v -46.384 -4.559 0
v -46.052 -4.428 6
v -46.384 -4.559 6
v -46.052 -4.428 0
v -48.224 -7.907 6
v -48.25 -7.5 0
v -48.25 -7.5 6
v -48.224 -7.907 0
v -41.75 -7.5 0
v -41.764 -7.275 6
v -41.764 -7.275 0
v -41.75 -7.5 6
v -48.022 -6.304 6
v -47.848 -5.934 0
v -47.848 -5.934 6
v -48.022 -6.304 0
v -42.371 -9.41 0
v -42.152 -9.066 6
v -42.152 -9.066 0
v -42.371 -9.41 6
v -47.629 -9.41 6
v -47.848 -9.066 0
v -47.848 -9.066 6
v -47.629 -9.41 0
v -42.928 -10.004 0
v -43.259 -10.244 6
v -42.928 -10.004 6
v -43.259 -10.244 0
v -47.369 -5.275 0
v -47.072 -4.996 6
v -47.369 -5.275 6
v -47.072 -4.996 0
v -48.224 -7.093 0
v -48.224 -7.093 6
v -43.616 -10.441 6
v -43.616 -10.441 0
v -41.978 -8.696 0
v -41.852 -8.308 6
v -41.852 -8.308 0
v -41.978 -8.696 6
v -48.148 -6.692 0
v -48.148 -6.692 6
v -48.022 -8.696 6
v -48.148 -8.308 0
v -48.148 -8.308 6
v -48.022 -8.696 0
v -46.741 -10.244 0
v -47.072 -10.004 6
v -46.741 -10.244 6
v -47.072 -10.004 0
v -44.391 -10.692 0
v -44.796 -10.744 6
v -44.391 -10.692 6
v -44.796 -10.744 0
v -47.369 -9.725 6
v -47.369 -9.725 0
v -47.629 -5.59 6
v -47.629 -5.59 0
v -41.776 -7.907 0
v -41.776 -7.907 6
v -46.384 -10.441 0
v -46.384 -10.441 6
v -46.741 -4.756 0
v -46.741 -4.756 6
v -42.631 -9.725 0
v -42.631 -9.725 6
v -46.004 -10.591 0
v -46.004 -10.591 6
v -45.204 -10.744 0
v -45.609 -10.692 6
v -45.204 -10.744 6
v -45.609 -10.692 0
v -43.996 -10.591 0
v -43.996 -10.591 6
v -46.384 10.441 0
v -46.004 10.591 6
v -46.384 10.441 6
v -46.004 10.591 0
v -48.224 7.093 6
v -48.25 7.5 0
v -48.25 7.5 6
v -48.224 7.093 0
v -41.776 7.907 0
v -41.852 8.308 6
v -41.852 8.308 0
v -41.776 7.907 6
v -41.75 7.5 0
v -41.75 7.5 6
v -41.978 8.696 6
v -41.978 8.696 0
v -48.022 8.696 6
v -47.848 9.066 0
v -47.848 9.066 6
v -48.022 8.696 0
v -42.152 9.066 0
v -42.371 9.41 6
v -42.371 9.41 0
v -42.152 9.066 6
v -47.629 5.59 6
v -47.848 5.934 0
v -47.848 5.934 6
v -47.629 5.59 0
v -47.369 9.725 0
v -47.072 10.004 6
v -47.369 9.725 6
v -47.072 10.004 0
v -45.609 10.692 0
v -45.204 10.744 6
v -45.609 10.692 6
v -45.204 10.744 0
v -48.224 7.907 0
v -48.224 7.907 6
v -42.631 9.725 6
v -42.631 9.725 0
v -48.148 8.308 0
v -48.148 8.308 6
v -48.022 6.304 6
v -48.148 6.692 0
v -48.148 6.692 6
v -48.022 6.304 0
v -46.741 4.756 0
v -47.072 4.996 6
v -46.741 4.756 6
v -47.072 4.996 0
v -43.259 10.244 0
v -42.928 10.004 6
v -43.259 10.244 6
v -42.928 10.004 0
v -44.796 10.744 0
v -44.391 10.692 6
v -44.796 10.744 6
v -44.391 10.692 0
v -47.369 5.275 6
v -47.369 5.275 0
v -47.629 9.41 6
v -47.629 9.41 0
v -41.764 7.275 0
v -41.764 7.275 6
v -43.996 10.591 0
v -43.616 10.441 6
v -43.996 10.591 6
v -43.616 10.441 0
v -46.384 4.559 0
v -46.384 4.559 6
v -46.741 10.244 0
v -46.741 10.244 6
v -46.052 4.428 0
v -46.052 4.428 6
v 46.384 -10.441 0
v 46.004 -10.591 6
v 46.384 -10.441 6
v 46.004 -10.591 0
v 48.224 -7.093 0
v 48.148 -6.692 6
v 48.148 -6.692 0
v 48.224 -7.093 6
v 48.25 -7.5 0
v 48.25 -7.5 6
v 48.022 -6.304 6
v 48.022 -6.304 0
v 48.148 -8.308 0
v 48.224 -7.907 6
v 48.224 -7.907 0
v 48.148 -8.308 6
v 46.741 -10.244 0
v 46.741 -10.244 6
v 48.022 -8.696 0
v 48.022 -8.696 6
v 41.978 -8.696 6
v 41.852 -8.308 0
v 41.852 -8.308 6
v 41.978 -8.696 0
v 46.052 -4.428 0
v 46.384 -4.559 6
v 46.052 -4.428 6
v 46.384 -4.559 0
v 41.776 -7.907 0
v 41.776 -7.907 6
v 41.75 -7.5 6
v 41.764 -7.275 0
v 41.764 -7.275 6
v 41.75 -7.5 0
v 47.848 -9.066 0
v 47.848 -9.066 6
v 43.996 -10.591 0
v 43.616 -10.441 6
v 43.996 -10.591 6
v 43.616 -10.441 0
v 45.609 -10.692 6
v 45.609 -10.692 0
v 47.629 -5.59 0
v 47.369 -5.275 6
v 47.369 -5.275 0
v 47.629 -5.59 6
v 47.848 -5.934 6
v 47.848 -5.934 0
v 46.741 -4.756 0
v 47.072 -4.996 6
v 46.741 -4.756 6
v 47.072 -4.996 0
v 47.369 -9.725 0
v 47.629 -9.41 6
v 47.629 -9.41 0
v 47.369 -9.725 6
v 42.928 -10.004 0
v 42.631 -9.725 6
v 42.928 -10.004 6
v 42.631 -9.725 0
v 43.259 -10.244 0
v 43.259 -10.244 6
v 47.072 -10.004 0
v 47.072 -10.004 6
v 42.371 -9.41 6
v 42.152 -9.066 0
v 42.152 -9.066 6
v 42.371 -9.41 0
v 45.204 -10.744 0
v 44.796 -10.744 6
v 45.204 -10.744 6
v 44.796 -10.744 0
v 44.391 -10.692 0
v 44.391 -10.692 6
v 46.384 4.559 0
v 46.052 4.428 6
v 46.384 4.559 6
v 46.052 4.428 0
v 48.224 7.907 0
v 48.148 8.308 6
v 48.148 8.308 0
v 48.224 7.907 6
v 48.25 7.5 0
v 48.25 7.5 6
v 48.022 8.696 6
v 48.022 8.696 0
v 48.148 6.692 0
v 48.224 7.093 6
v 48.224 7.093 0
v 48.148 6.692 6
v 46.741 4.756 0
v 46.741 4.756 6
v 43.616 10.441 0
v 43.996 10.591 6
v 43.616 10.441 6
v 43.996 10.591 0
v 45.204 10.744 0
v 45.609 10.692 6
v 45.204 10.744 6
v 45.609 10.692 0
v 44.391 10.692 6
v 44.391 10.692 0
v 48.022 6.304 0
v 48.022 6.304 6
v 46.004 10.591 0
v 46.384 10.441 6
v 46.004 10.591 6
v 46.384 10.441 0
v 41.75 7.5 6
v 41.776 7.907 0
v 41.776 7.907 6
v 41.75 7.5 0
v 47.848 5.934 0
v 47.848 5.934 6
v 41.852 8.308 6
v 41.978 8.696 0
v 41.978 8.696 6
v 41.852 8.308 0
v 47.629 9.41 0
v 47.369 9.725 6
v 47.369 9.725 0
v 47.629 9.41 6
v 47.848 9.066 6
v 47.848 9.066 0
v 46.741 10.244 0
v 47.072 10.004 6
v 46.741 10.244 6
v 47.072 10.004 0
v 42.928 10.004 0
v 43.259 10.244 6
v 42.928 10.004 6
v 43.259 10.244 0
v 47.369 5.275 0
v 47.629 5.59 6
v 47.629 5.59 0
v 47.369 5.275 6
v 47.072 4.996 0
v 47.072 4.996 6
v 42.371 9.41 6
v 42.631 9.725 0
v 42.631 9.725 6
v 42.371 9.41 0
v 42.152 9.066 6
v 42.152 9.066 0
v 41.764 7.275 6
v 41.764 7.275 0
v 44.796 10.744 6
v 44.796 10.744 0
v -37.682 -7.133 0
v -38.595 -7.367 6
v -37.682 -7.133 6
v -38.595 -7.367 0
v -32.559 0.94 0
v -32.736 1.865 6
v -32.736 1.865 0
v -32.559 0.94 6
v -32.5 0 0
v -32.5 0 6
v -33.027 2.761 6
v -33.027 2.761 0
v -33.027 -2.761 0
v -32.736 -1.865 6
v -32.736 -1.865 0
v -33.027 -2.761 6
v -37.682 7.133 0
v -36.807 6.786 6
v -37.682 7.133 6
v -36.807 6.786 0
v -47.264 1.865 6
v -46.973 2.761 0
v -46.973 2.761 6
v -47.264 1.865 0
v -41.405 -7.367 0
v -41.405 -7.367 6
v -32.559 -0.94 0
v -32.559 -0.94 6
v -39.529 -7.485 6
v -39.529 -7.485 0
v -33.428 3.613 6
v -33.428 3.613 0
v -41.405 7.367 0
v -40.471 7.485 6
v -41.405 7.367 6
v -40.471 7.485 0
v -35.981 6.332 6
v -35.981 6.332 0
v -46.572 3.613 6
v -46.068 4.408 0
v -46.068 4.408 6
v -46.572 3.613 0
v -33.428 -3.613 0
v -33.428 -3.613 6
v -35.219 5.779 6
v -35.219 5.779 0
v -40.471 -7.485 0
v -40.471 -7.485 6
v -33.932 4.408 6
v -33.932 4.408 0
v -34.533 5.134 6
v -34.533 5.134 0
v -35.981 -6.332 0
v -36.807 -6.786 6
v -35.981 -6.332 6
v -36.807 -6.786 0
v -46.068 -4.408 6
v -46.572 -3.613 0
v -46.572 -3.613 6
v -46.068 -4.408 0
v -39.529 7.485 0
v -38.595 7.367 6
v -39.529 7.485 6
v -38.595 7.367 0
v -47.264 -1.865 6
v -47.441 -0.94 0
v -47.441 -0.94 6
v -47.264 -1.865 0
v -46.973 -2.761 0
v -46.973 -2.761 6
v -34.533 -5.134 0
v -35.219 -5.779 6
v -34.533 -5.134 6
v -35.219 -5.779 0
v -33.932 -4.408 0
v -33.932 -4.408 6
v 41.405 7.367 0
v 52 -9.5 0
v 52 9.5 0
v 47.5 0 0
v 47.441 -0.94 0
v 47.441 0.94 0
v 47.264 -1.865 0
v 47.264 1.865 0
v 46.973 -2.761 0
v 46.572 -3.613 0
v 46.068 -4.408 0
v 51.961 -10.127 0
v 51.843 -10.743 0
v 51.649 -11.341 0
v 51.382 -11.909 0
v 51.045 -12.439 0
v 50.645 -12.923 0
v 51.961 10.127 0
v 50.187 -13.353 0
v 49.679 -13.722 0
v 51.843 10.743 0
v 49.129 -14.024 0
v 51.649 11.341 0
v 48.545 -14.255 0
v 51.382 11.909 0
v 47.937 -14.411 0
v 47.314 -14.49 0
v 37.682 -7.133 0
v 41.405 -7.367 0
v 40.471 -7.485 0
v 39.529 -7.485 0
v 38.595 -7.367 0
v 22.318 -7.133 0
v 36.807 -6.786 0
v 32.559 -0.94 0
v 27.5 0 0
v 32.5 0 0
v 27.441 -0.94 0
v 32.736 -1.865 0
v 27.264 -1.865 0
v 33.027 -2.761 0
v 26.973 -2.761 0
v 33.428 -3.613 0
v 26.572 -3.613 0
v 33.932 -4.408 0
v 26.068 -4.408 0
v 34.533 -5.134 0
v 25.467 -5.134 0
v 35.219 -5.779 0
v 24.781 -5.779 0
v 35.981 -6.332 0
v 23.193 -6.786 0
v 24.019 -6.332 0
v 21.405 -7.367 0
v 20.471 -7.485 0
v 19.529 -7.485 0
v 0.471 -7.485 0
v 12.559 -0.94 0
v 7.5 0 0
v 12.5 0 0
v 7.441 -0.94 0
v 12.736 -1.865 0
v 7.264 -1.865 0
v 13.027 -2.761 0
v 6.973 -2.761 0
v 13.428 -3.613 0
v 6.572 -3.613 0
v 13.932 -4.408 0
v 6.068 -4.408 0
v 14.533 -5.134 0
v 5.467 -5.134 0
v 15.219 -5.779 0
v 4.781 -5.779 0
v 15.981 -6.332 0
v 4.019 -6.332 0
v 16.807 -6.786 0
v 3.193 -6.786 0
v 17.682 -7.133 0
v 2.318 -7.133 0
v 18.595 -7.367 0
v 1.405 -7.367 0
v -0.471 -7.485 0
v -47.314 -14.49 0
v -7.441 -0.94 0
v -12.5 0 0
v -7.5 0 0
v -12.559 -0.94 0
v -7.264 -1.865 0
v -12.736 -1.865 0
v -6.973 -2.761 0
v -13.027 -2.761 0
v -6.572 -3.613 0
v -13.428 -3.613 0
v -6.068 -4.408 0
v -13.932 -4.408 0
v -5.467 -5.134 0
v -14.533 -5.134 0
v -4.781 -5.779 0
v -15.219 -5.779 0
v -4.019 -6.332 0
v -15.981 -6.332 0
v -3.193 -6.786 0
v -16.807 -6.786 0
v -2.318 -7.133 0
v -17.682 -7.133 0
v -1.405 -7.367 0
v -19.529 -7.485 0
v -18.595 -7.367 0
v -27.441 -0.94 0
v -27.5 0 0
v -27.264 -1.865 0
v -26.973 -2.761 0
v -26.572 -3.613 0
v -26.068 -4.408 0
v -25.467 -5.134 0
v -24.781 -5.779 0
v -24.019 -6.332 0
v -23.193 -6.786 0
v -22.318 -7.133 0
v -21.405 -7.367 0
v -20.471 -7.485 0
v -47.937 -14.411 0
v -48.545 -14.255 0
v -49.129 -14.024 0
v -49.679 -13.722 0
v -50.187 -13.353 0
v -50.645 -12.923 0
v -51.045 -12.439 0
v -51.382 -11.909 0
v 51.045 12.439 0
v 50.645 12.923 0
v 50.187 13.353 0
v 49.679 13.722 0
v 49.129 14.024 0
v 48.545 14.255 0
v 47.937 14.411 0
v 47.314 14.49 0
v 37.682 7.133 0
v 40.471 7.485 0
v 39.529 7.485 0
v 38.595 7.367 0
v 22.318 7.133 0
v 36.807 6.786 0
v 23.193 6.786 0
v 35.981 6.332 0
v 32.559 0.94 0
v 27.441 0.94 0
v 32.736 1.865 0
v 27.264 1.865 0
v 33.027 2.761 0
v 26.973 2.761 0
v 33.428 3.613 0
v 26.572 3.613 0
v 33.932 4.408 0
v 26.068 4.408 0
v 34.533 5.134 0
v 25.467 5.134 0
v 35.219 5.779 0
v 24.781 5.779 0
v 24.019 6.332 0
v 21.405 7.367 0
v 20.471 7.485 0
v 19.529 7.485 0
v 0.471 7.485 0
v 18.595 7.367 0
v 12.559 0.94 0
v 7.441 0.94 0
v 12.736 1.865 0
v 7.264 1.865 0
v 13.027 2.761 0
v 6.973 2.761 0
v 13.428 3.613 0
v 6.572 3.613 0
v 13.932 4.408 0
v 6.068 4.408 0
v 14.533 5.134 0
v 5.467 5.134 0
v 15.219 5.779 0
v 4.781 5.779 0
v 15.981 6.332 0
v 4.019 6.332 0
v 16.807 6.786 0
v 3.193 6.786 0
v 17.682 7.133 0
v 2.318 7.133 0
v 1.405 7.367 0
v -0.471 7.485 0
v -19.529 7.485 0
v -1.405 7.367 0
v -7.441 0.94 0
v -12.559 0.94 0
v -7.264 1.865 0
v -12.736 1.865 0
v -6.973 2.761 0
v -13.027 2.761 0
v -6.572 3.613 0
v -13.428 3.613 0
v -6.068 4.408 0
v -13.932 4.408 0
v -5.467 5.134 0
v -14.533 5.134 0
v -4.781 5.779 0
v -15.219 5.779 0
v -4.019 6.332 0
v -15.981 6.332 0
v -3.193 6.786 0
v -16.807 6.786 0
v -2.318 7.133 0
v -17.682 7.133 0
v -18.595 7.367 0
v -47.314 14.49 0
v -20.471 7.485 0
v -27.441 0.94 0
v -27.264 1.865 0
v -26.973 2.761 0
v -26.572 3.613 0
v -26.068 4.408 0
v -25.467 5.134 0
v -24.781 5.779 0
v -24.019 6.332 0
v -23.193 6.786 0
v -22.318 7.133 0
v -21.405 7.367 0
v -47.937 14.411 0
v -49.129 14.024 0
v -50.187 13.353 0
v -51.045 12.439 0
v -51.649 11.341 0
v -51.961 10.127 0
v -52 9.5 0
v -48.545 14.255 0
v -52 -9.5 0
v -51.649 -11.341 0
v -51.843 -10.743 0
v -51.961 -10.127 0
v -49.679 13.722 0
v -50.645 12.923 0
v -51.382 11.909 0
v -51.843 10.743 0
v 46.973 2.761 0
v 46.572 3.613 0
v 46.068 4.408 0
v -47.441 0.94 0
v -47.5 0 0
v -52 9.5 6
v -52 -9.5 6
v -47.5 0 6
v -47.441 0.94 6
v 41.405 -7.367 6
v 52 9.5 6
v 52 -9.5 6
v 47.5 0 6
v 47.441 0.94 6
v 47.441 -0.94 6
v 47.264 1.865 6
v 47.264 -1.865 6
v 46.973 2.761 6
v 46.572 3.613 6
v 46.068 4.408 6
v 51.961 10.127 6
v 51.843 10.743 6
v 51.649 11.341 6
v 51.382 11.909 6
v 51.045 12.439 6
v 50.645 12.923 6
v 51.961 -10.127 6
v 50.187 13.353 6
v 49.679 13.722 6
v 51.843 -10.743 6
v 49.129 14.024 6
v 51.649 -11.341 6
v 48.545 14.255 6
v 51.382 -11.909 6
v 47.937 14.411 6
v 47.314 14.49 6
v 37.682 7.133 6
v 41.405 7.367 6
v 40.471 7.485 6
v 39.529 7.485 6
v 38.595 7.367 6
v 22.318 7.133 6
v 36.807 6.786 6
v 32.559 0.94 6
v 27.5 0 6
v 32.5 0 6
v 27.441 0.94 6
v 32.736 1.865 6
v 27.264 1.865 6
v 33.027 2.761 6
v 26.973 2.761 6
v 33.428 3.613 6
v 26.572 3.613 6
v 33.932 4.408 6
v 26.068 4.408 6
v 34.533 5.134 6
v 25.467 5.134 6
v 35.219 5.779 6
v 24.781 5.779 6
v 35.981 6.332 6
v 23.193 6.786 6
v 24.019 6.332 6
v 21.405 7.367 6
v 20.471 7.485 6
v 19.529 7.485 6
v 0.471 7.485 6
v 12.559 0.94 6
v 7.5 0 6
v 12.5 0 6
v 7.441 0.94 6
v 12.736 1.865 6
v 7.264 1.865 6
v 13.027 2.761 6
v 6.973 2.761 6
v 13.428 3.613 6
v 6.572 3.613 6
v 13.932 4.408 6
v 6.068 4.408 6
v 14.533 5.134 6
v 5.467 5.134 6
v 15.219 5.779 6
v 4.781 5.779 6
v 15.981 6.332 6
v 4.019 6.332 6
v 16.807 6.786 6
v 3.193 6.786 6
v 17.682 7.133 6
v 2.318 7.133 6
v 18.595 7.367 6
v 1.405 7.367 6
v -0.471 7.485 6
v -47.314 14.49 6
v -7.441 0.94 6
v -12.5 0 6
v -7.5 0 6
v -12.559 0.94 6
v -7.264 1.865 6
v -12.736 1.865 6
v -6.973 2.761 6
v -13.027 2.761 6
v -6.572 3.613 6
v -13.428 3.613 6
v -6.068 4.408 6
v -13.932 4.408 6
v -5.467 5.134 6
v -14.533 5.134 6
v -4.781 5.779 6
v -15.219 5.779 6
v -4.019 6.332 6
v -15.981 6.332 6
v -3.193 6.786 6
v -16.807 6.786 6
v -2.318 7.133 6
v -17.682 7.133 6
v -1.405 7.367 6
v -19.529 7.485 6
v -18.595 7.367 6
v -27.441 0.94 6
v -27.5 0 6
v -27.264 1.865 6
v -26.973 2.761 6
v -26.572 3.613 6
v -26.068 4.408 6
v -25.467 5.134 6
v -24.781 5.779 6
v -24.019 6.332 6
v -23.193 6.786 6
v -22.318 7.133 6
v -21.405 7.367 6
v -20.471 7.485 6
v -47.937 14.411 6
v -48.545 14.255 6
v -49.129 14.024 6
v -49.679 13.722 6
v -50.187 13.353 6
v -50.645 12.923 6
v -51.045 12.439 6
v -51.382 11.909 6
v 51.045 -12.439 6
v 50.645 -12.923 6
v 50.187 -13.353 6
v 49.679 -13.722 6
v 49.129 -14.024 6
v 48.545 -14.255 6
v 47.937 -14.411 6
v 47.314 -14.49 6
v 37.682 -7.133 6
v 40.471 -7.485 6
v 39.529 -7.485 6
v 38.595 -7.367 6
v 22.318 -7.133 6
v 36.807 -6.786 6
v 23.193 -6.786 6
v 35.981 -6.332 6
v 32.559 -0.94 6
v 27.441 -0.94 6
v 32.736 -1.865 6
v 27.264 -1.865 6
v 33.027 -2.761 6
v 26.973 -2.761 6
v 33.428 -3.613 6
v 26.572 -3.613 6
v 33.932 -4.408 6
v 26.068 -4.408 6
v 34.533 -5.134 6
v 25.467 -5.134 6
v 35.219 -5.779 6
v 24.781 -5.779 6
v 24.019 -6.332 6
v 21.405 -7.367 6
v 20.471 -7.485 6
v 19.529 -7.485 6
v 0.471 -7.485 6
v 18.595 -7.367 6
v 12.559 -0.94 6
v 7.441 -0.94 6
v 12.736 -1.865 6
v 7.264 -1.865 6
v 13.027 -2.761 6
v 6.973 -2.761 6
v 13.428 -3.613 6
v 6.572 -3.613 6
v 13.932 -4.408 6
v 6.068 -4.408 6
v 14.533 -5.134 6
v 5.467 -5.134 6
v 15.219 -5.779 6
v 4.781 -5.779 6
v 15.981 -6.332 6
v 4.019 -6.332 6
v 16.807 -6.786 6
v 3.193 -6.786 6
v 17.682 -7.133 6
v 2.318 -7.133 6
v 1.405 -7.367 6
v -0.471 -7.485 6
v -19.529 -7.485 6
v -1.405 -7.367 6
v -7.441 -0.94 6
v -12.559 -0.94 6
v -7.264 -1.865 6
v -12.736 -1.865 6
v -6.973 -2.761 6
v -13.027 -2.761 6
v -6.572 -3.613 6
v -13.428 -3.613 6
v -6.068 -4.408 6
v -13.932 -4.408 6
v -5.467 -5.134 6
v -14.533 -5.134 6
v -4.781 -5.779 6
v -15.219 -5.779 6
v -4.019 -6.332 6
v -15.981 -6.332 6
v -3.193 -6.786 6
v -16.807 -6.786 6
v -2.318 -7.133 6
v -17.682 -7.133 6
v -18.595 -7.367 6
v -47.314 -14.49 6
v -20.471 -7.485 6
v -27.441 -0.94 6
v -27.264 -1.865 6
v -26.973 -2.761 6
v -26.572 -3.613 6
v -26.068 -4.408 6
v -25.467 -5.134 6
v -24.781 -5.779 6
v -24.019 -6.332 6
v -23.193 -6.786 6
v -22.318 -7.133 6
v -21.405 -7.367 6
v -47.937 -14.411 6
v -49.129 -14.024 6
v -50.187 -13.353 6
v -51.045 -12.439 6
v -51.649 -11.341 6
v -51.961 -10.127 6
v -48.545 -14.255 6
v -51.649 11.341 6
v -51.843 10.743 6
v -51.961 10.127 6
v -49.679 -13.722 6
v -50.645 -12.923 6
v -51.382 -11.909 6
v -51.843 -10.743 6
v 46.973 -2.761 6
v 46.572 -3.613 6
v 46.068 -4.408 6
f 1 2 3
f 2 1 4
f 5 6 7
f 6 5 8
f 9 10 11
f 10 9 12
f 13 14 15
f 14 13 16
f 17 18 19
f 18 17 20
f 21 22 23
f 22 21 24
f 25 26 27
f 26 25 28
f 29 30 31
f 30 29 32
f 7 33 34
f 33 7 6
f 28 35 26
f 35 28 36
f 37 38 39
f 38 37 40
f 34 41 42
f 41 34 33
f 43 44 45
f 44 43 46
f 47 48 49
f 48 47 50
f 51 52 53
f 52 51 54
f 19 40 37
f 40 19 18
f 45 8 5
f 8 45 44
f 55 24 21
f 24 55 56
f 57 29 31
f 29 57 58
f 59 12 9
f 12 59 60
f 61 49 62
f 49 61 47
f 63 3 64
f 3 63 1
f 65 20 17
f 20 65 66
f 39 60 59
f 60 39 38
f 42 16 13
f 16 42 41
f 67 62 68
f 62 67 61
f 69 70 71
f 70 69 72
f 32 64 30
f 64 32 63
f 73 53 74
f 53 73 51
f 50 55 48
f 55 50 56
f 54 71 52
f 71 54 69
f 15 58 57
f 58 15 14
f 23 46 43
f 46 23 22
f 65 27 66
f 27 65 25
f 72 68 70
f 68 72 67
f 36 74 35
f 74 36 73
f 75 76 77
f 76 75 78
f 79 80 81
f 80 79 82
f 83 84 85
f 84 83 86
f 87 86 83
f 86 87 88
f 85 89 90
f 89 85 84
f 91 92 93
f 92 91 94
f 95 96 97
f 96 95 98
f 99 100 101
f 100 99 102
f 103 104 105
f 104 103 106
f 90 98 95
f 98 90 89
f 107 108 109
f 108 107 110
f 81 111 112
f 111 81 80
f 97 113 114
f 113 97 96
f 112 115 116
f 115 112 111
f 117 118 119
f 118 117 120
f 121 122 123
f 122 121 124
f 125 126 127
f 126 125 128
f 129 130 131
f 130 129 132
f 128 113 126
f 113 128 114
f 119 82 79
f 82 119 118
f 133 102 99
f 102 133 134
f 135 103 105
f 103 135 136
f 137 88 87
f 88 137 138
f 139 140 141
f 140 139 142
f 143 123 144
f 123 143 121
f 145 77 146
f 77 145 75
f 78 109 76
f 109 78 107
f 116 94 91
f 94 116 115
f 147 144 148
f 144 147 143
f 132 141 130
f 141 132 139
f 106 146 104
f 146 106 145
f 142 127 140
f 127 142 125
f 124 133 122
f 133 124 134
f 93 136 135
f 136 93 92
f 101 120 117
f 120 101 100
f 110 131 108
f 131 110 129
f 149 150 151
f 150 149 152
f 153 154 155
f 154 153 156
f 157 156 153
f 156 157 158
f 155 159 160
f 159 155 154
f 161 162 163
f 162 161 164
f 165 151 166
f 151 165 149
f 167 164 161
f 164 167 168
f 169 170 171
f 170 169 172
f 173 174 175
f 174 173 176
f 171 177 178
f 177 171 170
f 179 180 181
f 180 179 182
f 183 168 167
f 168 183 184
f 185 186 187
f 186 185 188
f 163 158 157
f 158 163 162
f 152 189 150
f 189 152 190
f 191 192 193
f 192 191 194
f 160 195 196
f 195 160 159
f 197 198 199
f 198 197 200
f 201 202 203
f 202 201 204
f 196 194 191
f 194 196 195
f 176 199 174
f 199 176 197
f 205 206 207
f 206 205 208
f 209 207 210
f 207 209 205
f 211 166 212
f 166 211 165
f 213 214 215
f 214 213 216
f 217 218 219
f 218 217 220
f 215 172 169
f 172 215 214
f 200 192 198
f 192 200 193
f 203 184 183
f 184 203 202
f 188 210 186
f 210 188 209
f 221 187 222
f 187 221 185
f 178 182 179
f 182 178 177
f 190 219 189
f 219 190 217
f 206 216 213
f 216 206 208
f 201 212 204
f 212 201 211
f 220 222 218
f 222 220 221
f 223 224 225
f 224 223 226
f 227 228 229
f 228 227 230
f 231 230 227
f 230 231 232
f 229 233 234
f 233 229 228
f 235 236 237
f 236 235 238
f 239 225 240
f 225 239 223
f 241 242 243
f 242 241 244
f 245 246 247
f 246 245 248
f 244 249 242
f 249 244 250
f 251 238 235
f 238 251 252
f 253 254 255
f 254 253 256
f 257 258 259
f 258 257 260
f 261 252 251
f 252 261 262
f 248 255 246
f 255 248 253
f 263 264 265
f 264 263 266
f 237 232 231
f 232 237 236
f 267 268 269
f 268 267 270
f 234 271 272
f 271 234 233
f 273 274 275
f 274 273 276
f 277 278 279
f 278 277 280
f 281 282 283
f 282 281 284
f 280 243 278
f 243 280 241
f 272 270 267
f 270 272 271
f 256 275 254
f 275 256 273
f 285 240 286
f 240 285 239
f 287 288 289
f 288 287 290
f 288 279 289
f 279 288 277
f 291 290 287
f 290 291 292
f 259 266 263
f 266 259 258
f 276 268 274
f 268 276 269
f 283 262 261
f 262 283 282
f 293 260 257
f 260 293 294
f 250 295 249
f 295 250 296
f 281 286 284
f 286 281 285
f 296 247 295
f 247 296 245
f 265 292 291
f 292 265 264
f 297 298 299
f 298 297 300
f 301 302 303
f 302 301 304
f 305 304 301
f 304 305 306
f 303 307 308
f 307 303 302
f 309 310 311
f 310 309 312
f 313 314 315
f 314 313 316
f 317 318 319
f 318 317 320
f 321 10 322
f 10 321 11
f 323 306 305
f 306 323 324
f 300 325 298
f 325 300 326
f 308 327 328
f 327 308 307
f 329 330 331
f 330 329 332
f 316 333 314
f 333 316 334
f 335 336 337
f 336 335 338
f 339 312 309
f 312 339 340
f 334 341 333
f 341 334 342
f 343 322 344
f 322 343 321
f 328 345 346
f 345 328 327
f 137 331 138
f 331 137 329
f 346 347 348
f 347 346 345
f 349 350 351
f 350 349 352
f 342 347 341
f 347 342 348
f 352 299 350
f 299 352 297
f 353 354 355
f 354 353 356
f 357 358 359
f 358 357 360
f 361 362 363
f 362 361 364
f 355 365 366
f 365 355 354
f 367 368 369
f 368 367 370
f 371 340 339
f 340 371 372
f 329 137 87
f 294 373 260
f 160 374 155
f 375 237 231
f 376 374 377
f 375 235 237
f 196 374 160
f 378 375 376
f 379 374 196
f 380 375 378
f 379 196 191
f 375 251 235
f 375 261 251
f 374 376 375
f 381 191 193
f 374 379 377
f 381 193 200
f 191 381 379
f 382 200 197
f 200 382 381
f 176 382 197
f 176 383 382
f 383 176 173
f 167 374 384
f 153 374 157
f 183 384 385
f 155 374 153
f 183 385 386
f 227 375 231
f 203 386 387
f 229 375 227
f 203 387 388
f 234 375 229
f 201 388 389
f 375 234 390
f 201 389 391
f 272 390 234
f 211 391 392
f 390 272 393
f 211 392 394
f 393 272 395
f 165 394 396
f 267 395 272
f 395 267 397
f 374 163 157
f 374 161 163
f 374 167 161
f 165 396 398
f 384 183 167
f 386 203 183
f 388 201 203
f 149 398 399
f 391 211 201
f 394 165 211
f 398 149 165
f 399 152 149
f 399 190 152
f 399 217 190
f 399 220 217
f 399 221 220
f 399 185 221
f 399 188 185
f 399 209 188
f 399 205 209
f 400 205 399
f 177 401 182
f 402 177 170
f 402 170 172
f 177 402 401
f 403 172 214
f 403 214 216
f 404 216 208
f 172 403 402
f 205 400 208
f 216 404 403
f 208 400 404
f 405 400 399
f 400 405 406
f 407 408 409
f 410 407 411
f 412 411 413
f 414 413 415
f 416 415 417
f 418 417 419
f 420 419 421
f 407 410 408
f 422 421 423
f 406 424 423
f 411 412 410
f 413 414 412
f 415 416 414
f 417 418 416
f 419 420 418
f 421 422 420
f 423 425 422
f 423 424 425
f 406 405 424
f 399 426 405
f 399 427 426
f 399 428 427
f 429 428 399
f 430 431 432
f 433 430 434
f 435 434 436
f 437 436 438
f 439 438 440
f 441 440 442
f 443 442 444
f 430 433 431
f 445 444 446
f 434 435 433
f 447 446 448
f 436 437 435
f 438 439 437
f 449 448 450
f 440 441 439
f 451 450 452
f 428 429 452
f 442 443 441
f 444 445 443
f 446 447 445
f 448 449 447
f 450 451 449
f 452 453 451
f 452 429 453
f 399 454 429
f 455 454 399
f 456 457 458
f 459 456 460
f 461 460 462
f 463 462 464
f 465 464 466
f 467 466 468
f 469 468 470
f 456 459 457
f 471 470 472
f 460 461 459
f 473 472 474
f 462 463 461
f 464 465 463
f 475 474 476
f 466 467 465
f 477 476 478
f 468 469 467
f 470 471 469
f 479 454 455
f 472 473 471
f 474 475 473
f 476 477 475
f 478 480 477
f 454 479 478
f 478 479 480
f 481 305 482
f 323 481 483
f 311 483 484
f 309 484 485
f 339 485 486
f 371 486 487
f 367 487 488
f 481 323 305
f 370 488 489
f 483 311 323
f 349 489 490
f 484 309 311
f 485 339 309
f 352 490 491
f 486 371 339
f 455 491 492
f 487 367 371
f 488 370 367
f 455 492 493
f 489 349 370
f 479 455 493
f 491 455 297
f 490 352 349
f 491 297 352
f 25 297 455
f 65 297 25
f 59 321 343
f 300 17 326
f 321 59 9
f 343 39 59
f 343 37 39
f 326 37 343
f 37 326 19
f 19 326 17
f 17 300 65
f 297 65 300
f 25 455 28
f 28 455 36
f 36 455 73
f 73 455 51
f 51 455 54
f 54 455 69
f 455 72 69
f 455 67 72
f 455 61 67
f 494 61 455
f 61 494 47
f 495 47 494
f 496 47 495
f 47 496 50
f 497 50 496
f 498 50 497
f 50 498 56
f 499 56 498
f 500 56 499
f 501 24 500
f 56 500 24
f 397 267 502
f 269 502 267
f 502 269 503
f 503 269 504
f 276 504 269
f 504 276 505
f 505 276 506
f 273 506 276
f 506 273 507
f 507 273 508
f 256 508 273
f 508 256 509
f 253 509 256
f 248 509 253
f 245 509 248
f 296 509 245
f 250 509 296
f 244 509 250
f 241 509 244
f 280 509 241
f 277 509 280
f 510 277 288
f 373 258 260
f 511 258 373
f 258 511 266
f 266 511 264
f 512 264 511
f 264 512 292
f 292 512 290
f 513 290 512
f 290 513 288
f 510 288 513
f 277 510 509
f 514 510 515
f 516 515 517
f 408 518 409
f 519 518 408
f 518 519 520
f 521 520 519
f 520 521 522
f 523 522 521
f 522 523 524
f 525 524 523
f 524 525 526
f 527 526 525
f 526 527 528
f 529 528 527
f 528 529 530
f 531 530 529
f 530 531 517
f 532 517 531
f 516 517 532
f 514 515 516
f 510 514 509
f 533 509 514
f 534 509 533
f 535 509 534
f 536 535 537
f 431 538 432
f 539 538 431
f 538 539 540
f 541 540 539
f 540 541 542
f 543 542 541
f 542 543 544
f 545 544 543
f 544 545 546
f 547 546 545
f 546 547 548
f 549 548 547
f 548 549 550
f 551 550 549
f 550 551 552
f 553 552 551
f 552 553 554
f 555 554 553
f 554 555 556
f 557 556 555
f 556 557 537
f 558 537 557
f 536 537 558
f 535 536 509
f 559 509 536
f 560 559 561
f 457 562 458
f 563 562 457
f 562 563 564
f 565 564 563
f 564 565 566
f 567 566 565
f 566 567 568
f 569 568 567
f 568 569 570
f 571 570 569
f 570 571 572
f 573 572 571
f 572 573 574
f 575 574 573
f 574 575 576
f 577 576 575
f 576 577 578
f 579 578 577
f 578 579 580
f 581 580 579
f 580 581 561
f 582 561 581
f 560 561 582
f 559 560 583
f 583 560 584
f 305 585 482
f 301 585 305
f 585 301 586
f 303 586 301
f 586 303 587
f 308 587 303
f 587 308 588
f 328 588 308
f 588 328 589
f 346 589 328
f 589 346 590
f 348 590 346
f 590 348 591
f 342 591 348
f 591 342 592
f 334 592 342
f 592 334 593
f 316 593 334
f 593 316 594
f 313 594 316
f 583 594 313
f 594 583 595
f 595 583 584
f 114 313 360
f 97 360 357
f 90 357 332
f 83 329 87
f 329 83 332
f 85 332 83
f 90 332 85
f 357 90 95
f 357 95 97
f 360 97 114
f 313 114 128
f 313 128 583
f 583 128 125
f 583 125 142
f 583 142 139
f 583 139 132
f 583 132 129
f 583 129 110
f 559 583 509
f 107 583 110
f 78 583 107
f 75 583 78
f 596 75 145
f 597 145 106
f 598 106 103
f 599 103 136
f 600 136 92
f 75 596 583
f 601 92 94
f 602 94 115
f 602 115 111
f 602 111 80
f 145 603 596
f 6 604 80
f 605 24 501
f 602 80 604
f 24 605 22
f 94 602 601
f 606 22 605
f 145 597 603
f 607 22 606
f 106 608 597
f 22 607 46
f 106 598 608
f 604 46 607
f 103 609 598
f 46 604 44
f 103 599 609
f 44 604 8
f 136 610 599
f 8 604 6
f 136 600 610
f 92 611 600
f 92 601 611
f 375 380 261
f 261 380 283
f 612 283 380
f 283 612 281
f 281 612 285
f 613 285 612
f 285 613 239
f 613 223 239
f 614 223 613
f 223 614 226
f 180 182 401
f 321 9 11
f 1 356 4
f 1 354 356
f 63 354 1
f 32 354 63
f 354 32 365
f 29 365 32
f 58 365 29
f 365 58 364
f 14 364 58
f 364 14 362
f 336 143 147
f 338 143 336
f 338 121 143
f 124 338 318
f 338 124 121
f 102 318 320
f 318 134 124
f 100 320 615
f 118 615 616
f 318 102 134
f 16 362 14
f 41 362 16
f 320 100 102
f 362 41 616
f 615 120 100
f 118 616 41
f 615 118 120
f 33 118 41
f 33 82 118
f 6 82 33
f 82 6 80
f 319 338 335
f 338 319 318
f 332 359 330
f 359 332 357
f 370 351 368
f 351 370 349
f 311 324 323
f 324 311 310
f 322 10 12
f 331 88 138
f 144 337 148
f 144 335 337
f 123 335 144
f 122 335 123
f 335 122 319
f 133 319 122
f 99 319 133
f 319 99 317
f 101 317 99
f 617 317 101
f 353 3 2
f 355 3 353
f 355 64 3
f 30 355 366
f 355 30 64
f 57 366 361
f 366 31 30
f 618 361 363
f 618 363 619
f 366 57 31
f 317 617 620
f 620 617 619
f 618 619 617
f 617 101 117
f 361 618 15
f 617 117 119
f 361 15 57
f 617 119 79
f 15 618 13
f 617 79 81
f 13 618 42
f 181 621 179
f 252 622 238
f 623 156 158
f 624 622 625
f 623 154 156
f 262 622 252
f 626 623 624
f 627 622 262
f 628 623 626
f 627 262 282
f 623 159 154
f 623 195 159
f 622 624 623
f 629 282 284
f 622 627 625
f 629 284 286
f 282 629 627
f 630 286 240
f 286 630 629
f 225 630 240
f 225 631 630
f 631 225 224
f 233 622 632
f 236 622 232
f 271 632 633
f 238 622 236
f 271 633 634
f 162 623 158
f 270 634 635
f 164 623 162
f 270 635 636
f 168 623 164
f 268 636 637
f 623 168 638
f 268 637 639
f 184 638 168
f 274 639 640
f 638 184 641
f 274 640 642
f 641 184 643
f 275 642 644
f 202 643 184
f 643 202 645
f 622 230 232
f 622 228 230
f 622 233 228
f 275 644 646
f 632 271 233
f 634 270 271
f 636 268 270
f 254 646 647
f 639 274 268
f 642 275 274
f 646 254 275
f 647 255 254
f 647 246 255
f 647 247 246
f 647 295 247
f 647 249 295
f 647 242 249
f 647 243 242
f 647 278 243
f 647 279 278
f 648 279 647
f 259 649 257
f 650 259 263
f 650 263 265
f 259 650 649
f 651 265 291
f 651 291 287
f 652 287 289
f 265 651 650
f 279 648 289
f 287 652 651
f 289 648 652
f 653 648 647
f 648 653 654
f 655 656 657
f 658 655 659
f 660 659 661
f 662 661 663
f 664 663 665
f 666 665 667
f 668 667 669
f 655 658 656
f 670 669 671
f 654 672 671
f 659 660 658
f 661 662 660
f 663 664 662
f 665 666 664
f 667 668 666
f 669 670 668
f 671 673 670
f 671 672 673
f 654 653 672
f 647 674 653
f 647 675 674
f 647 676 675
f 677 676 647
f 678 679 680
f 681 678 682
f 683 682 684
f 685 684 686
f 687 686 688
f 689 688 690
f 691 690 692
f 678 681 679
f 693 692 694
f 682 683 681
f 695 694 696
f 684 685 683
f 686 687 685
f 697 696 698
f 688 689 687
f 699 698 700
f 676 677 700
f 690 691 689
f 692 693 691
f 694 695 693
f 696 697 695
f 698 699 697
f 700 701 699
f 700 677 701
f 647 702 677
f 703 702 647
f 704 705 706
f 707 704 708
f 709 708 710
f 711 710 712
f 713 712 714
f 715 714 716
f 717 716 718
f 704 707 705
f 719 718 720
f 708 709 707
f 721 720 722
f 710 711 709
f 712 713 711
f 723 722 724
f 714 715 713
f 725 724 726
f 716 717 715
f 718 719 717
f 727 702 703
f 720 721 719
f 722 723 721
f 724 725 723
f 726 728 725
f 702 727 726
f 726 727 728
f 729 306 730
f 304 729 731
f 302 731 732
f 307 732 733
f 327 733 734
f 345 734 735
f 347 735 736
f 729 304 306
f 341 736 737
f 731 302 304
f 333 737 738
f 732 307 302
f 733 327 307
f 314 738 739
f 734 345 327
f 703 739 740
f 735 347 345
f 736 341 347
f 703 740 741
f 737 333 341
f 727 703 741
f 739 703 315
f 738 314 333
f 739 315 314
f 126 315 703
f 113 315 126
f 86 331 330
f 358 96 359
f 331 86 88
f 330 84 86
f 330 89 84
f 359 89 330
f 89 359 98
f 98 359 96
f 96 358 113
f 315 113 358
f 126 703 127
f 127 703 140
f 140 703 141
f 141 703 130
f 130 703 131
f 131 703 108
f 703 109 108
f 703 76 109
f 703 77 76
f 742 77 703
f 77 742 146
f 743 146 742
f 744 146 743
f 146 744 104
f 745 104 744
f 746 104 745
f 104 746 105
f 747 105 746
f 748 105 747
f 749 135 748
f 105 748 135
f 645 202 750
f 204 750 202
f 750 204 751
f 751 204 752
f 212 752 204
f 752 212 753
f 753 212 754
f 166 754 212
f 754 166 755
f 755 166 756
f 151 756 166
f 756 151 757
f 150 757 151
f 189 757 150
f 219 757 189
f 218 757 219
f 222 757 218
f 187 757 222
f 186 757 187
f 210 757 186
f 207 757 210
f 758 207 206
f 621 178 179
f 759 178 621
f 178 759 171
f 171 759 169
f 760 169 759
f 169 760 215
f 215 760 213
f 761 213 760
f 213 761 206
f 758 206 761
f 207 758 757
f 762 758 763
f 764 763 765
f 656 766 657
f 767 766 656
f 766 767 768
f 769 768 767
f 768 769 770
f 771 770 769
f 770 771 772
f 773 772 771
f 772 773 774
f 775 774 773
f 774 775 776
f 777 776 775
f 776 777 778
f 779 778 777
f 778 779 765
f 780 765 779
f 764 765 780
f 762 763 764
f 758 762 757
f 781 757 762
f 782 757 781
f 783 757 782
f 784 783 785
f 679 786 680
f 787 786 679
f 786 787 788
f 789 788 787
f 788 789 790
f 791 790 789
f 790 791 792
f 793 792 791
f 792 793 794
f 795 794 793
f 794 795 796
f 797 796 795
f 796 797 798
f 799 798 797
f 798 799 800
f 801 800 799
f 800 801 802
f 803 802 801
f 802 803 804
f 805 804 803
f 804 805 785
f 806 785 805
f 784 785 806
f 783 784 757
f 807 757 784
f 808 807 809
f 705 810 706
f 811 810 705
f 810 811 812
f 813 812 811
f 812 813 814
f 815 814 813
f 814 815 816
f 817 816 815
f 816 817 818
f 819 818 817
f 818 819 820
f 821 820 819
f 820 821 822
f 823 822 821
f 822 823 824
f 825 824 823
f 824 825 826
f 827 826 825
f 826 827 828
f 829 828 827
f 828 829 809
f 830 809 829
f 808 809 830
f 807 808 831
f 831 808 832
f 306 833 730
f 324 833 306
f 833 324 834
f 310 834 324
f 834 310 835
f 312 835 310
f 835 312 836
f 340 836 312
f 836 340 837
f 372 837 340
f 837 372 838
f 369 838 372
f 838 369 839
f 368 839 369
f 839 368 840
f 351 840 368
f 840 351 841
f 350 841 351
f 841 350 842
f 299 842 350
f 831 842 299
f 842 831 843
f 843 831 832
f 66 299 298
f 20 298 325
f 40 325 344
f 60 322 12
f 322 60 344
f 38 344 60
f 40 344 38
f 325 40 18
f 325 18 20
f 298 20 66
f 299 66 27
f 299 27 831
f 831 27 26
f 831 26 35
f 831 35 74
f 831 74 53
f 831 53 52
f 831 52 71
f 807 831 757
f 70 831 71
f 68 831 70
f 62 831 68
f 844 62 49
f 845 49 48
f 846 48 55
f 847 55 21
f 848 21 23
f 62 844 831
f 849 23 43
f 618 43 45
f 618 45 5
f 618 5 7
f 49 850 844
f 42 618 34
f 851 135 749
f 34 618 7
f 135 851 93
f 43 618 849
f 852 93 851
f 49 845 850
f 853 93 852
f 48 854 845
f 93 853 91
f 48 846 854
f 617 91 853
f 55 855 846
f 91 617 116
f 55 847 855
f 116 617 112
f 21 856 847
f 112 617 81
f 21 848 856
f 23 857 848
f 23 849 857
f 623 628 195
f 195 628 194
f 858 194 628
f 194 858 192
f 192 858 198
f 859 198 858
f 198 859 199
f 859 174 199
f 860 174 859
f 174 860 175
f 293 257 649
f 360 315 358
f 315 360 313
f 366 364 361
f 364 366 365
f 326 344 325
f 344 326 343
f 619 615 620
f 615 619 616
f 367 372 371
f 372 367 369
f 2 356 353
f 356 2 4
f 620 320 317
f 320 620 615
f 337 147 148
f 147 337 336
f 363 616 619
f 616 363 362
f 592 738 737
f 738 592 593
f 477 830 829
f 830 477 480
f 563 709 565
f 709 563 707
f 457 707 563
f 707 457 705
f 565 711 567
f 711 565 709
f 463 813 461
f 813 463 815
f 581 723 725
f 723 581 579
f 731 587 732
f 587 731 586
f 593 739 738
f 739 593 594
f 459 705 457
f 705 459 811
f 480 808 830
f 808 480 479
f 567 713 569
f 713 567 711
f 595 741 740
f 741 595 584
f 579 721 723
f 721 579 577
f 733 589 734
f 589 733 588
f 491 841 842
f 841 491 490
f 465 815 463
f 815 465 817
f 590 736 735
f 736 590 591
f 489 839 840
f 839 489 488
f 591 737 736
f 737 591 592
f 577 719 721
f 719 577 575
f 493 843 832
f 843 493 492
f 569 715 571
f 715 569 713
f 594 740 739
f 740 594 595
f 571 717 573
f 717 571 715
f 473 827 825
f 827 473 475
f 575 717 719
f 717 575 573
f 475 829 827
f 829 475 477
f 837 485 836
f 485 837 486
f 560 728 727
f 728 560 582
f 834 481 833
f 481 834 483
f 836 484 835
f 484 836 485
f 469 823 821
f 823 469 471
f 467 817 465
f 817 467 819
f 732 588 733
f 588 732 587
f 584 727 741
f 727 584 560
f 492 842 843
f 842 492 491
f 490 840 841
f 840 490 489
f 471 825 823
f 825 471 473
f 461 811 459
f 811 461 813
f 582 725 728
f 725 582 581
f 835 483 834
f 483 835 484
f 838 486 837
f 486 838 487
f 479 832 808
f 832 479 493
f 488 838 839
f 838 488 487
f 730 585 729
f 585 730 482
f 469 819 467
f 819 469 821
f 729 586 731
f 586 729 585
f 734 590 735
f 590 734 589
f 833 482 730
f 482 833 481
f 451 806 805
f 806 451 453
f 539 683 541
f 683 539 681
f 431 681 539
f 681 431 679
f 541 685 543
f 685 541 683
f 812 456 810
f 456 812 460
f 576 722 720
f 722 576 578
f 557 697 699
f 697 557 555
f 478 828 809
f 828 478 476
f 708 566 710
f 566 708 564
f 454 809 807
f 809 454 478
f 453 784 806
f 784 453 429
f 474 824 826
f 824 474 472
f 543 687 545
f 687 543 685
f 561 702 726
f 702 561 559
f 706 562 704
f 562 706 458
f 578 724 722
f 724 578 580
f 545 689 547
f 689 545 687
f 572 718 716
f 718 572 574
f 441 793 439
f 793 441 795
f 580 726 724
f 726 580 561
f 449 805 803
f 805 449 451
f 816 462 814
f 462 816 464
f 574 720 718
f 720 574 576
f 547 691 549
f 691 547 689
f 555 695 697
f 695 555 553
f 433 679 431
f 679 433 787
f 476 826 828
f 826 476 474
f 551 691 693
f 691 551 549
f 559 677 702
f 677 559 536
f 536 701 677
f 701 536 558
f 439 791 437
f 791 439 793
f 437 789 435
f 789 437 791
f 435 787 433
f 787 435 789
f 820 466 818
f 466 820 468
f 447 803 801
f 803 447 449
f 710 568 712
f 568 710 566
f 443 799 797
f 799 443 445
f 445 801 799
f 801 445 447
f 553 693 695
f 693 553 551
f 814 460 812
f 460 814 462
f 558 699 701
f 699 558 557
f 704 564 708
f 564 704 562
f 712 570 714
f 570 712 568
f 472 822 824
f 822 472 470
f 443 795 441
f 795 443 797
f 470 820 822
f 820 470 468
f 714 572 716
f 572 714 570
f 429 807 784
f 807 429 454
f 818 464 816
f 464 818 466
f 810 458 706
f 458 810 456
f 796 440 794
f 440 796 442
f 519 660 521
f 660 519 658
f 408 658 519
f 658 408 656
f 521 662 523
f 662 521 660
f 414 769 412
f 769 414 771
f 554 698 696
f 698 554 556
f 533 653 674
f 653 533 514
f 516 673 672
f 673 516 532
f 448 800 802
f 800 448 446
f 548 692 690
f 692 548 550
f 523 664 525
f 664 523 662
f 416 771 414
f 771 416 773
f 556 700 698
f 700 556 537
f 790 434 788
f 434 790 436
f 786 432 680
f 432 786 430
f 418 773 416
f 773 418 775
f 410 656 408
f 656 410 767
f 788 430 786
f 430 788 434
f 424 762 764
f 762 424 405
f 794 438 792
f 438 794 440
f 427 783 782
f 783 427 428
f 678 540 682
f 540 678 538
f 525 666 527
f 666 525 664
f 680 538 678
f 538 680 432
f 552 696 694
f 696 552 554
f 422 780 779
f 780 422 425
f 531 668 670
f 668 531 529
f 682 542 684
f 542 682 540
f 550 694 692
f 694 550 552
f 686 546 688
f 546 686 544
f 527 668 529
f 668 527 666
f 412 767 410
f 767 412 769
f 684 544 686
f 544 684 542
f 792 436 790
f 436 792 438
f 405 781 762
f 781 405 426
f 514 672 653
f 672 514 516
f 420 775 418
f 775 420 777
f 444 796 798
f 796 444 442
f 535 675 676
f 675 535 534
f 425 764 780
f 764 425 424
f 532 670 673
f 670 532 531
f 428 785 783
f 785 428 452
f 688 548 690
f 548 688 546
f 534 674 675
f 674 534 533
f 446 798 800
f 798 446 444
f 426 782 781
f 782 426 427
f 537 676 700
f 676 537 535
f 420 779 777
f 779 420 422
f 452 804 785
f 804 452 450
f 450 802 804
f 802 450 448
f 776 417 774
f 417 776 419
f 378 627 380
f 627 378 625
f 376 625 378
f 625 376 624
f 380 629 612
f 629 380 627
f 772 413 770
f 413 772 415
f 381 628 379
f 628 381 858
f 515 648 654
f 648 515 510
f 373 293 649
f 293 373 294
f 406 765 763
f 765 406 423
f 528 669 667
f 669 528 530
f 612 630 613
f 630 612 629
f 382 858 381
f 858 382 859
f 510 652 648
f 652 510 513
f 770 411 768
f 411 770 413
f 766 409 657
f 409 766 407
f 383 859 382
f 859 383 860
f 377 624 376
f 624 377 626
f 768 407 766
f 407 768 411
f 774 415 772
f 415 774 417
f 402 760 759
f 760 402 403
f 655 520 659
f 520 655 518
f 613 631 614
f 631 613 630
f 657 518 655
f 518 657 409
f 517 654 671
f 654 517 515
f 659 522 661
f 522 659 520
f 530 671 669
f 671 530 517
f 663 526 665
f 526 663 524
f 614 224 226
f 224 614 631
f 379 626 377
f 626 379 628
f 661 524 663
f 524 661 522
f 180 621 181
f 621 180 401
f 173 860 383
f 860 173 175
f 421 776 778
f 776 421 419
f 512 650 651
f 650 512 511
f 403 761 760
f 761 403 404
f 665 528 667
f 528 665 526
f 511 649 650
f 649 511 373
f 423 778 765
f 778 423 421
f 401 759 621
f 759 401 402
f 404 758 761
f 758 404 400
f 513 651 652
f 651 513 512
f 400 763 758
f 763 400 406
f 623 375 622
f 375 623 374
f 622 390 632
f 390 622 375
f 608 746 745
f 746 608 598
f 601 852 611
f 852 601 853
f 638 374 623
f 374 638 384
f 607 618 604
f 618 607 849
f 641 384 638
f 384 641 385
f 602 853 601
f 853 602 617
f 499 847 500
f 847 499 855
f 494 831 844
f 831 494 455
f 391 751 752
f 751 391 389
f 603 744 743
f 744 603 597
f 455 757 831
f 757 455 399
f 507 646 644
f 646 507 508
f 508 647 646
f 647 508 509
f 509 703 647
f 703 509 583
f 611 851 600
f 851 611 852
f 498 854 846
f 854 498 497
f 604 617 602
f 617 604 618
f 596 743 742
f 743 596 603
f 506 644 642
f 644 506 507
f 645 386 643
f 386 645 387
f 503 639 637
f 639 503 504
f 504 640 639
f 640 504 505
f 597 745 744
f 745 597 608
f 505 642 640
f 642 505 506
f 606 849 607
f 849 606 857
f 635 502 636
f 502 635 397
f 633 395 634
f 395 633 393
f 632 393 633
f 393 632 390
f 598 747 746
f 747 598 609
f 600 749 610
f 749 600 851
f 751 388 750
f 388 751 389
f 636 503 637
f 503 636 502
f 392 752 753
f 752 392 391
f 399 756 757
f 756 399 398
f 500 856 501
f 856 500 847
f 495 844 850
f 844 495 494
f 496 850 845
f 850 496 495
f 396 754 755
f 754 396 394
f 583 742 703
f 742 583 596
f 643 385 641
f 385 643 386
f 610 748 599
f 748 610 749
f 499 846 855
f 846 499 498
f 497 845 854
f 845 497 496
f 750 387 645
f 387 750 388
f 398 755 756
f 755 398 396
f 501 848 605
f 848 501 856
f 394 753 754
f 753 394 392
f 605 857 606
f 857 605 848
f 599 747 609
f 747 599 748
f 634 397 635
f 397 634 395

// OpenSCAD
$fn = 50;


difference() {
	union() {
		hull() {
			translate(v = [-47.0000000000, 9.5000000000, 0]) {
				cylinder(h = 6, r = 5);
			}
			translate(v = [47.0000000000, 9.5000000000, 0]) {
				cylinder(h = 6, r = 5);
			}
			translate(v = [-47.0000000000, -9.5000000000, 0]) {
				cylinder(h = 6, r = 5);
			}
			translate(v = [47.0000000000, -9.5000000000, 0]) {
				cylinder(h = 6, r = 5);
			}
		}
	}
	union() {
		#translate(v = [-45.0000000000, -7.5000000000, -100.0000000000]) {
			cylinder(h = 200, r = 3.2500000000);
		}
		#translate(v = [-45.0000000000, 7.5000000000, -100.0000000000]) {
			cylinder(h = 200, r = 3.2500000000);
		}
		#translate(v = [45.0000000000, -7.5000000000, -100.0000000000]) {
			cylinder(h = 200, r = 3.2500000000);
		}
		#translate(v = [45.0000000000, 7.5000000000, -100.0000000000]) {
			cylinder(h = 200, r = 3.2500000000);
		}
		#translate(v = [-40.0000000000, 0, 0]) {
			cylinder(h = 6, r = 7.5000000000);
		}
		#translate(v = [-20.0000000000, 0, 0]) {
			cylinder(h = 6, r = 7.5000000000);
		}
		#cylinder(h = 6, r = 7.5000000000);
		#translate(v = [20.0000000000, 0, 0]) {
			cylinder(h = 6, r = 7.5000000000);
		}
		#translate(v = [40.0000000000, 0, 0]) {
			cylinder(h = 6, r = 7.5000000000);
		}
	}
}
